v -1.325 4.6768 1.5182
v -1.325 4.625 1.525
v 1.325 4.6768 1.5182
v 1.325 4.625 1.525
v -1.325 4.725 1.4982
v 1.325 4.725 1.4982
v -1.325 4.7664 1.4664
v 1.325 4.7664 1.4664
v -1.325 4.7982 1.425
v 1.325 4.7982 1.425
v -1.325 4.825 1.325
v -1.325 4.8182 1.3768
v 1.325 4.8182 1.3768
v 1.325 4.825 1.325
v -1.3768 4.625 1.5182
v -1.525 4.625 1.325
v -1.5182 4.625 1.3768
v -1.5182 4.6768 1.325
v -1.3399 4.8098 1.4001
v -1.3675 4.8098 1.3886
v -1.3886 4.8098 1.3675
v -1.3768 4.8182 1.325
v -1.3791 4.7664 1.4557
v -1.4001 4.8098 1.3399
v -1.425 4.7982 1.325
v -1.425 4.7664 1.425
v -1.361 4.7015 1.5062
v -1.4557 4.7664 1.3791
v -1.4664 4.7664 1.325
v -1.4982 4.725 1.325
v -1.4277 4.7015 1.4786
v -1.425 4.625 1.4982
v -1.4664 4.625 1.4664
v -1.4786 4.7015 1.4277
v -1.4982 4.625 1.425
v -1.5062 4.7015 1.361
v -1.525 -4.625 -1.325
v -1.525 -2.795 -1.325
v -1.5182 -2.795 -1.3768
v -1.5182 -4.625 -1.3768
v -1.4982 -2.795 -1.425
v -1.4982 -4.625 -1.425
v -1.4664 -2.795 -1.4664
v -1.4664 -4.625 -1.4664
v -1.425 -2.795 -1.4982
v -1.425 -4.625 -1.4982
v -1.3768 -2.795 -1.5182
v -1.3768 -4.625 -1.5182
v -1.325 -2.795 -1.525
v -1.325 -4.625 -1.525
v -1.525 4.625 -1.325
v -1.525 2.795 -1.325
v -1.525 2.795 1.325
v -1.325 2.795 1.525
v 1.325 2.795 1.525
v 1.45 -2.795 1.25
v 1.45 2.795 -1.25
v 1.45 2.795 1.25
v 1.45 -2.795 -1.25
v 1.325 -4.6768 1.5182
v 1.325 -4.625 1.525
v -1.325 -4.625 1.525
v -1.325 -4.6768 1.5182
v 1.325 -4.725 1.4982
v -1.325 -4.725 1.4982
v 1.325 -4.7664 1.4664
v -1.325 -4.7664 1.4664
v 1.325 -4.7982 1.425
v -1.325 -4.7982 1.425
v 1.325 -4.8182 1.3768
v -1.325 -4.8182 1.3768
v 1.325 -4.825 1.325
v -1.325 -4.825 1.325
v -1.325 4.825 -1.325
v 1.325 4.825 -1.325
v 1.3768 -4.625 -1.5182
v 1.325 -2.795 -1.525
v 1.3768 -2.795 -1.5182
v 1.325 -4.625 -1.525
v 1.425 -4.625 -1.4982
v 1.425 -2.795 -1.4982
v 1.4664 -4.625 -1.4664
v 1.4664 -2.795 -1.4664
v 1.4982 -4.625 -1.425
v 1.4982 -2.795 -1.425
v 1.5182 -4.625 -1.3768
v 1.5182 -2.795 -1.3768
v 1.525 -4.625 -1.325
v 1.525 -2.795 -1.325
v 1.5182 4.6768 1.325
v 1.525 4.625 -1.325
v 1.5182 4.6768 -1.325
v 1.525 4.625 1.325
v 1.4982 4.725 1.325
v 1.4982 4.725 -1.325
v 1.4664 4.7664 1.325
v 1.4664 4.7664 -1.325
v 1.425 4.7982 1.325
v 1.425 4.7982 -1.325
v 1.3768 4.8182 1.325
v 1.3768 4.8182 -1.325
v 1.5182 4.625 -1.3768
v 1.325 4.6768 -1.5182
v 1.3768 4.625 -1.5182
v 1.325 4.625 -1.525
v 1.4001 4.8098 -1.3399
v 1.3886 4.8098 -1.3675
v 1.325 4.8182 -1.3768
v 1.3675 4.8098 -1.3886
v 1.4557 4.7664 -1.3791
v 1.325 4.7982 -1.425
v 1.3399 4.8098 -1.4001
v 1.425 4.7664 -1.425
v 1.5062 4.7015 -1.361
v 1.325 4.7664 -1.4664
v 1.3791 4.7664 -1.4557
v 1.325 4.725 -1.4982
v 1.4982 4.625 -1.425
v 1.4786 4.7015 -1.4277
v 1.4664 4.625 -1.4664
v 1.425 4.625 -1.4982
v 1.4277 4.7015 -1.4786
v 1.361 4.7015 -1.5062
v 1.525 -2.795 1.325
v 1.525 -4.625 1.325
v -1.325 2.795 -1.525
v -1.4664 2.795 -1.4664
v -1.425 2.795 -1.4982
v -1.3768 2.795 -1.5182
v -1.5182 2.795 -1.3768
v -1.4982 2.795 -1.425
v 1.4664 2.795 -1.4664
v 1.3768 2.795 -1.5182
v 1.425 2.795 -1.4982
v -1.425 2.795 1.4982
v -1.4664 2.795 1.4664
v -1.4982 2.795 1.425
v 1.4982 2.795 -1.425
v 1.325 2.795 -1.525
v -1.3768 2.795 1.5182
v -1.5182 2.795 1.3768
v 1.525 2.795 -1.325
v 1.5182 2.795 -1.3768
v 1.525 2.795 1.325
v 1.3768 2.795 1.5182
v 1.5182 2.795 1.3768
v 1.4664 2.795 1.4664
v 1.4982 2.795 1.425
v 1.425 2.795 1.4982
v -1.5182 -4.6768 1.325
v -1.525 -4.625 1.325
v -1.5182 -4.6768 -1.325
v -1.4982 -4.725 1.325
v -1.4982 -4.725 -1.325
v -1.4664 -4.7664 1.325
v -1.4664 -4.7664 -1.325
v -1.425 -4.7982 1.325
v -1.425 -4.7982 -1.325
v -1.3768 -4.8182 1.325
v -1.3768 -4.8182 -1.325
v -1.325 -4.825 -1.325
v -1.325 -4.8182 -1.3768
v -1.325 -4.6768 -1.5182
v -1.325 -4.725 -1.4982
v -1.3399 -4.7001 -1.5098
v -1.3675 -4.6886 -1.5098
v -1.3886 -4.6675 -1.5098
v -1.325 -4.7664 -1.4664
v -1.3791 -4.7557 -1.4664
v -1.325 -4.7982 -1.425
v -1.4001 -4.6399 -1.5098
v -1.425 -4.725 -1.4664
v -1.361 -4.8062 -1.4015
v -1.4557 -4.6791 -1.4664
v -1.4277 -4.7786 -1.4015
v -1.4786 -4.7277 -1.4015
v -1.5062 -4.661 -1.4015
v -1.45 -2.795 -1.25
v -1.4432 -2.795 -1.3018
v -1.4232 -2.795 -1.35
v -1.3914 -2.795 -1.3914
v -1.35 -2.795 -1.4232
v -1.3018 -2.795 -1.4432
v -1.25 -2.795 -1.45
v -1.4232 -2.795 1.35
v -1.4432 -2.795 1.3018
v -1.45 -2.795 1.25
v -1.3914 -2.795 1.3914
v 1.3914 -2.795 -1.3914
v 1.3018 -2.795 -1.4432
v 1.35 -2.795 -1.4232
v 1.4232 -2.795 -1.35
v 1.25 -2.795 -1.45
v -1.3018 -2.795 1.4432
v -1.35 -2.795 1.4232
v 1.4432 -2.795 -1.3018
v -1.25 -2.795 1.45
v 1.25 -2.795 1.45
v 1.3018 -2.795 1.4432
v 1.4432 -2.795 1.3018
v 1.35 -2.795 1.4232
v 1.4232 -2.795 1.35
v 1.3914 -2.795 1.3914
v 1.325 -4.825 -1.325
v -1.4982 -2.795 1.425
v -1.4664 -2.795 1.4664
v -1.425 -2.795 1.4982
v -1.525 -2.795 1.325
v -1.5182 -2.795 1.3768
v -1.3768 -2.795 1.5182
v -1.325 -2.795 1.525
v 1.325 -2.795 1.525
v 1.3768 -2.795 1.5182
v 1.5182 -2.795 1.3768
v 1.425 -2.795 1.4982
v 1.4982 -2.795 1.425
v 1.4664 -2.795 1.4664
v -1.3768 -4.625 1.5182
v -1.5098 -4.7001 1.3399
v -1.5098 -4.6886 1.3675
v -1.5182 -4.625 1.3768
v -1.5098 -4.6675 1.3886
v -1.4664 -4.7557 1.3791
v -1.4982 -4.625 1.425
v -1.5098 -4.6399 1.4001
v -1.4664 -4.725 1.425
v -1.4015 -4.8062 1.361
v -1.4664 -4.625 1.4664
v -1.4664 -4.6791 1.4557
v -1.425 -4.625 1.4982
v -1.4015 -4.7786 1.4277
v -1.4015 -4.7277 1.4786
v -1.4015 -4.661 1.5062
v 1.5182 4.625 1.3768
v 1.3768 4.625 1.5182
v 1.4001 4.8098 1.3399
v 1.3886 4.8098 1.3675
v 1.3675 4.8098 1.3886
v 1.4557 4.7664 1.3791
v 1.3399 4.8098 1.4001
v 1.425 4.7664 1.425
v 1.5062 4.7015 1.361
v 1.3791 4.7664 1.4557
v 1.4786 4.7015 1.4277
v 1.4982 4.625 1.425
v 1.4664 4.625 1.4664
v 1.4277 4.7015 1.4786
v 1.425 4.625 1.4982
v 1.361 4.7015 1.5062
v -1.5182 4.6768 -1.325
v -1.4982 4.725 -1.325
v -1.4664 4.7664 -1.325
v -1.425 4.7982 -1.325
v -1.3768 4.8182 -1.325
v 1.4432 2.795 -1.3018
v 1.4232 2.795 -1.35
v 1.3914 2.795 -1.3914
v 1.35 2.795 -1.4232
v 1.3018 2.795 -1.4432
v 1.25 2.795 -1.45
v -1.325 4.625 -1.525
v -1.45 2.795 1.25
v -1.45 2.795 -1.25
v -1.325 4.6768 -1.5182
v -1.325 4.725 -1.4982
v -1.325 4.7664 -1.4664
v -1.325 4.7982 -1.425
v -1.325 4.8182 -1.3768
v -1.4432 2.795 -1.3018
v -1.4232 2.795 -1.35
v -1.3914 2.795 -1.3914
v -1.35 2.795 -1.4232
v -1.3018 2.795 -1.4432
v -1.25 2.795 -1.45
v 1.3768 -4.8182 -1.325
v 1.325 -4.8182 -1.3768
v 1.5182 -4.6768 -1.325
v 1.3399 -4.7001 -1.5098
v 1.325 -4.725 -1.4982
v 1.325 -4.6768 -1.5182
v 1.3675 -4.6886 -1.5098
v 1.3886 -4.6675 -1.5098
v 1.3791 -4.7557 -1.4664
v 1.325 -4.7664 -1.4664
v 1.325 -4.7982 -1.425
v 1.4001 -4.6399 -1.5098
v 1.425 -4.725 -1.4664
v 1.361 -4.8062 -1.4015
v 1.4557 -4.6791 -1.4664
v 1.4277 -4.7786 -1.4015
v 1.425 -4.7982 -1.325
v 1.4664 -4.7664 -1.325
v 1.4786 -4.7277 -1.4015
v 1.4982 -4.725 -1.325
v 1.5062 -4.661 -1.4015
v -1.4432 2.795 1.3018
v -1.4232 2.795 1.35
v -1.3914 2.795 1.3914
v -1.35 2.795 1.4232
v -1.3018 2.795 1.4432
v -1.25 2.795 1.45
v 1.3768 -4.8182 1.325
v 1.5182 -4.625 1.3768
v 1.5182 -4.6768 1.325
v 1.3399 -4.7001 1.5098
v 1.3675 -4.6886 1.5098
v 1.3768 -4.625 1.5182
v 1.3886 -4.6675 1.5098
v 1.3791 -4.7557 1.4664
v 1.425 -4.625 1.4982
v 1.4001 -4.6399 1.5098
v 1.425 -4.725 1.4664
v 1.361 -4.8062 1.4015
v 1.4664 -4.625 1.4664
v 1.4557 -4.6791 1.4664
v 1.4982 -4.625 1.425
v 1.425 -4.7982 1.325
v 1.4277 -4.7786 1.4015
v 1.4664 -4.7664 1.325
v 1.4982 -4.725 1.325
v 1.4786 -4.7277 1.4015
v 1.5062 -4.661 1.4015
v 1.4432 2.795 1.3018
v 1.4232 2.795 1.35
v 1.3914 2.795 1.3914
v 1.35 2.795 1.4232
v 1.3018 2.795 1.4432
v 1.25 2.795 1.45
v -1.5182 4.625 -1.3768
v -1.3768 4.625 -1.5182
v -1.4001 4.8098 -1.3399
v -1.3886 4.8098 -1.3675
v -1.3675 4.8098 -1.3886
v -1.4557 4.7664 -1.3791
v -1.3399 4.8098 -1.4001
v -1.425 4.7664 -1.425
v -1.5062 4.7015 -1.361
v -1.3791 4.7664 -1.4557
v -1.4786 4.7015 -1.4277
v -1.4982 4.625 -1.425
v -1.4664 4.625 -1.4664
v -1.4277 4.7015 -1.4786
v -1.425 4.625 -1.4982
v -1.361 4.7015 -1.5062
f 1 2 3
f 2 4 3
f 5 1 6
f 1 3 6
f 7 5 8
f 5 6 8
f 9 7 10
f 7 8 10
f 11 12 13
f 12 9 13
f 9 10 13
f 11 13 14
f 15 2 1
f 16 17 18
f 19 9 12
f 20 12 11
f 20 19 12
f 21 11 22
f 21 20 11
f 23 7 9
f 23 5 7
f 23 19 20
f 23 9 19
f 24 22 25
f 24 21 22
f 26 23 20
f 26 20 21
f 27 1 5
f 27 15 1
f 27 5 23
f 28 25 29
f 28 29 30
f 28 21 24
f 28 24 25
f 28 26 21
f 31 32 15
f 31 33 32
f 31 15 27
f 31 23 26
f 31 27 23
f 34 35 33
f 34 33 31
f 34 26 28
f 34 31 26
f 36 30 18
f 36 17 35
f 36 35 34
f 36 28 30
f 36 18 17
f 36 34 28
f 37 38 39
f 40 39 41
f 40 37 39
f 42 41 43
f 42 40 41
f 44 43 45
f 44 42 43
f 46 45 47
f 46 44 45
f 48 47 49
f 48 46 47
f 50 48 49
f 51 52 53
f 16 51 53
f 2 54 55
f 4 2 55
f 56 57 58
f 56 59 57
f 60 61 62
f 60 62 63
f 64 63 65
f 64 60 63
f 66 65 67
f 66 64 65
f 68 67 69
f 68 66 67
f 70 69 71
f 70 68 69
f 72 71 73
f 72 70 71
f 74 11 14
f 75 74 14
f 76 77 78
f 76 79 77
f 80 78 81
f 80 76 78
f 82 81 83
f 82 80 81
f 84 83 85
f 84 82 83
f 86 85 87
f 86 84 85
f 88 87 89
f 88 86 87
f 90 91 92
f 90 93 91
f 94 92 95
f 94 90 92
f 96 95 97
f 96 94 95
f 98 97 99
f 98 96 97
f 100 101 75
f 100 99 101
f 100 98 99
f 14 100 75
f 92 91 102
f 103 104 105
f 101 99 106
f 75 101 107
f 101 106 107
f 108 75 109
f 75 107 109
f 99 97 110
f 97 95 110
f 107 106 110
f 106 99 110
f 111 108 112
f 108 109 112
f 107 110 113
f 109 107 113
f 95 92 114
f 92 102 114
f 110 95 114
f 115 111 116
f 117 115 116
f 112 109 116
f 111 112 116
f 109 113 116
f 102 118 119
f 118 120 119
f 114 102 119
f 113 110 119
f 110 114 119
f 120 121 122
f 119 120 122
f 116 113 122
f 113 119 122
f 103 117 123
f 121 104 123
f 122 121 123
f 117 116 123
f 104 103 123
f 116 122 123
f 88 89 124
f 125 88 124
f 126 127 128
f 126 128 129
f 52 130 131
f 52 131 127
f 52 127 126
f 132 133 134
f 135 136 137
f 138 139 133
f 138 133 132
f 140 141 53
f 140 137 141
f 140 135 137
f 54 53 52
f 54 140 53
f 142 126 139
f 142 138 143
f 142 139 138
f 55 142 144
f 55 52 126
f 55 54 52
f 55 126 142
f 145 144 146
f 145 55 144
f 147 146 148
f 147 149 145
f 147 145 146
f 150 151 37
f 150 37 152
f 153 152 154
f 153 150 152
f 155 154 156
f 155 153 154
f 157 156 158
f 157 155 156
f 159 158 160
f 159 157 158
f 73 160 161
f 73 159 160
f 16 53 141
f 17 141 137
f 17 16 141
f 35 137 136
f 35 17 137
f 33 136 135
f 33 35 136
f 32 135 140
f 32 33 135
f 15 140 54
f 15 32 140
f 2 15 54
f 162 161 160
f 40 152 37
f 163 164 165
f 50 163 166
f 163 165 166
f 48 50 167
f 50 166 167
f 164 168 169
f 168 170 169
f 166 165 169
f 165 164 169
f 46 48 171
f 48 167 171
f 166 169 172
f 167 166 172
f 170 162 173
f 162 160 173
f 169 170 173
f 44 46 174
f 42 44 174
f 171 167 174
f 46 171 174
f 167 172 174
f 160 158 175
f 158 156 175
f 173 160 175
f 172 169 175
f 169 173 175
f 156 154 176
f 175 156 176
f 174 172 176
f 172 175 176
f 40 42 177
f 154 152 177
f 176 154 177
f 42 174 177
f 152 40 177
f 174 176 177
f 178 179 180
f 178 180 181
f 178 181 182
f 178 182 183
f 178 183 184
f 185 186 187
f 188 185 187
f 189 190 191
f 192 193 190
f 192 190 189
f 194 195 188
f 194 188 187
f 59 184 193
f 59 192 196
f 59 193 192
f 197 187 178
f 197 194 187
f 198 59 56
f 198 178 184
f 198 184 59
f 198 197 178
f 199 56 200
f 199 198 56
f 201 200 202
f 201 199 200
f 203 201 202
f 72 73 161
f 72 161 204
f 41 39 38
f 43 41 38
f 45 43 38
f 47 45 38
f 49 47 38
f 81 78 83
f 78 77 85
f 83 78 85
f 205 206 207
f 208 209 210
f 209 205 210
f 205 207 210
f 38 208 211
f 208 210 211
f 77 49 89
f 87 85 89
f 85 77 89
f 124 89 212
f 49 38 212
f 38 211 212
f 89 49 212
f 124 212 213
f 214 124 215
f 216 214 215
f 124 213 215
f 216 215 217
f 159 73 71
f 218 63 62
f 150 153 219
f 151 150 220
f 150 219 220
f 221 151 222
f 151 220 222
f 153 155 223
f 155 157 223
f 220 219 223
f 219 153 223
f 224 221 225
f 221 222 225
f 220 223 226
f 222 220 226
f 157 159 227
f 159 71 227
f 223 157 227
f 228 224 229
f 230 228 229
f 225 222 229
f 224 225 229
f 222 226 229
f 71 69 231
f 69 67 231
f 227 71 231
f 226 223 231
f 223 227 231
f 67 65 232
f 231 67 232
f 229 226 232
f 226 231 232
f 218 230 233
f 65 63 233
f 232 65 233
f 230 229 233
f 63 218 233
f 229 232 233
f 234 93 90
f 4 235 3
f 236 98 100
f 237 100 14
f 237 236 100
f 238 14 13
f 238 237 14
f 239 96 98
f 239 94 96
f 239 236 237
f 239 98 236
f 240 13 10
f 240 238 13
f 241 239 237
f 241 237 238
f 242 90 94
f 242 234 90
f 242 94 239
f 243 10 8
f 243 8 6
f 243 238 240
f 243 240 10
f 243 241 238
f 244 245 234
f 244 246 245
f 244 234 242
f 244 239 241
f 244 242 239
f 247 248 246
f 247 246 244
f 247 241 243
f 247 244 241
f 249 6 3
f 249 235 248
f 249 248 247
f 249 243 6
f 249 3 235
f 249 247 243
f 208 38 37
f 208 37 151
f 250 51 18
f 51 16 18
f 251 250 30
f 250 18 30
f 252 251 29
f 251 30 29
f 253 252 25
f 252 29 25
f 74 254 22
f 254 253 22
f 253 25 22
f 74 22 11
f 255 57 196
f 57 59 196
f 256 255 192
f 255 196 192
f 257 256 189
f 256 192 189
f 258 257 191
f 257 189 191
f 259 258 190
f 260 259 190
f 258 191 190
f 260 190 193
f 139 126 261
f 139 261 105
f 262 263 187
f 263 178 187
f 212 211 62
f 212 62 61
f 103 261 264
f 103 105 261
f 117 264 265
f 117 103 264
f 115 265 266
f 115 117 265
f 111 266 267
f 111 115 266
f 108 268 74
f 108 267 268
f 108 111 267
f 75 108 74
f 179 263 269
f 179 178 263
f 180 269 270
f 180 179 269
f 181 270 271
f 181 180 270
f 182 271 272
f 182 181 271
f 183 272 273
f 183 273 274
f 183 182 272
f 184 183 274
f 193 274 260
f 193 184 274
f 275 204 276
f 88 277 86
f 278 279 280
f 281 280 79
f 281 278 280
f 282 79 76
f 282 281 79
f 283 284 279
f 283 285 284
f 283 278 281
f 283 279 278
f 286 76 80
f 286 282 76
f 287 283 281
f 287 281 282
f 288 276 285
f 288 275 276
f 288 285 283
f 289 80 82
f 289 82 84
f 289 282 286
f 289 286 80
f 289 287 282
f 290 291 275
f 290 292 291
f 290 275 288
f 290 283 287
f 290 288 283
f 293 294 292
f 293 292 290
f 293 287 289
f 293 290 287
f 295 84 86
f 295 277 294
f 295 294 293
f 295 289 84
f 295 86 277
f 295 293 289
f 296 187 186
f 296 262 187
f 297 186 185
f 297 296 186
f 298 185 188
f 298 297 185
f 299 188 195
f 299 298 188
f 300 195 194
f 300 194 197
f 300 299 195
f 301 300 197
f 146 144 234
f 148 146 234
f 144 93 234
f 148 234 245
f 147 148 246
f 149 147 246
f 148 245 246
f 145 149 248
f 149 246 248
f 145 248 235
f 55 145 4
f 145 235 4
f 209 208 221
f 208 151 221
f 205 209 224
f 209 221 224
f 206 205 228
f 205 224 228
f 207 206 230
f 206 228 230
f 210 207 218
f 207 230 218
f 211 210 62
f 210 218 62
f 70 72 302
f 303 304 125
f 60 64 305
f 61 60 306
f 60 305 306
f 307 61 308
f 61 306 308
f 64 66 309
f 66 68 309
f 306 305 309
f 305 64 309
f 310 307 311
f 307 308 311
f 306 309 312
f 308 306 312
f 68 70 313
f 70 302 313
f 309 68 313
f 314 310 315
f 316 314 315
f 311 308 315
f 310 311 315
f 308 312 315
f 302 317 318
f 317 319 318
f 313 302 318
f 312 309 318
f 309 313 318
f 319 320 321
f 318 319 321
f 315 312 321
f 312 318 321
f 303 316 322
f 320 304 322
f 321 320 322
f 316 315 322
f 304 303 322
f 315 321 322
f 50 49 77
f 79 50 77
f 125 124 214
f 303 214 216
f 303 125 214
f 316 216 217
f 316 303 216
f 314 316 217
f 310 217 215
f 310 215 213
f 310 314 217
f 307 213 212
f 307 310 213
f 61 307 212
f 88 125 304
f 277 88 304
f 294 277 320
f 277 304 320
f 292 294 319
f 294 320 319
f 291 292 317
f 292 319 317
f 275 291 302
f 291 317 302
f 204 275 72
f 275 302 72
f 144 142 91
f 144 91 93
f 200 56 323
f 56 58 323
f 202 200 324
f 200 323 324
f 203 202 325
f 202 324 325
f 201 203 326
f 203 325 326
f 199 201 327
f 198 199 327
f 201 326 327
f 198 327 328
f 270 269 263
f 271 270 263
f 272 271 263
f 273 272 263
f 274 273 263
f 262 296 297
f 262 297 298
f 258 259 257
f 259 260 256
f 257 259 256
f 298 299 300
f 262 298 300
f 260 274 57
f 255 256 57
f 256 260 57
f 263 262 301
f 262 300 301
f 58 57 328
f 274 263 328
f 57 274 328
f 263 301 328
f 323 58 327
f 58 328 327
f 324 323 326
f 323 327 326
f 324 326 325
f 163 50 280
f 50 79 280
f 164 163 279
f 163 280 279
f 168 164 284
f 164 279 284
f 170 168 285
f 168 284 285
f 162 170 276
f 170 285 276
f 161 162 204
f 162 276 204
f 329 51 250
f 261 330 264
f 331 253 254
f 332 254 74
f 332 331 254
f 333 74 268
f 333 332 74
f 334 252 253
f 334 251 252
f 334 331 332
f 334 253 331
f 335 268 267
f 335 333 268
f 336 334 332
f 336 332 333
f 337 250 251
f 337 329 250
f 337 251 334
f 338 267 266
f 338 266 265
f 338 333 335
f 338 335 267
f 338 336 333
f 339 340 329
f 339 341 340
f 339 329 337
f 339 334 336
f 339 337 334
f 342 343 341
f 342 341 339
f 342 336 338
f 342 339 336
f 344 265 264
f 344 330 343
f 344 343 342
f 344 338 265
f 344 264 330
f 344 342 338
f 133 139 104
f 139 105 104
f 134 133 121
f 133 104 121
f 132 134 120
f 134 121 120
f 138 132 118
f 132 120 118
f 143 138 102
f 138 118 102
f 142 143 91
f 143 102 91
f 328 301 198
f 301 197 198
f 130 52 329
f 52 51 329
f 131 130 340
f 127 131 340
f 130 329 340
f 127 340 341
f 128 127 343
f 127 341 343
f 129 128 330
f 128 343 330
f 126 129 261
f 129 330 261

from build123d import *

# Parameters (mm, degrees)
F2_W     = 2.9
F2_H     = 2.9
F3_DEPTH = 2.795
F4_W     = 3.05
F4_H     = 3.05
F5_DEPTH = 2.03
F6_R     = 0.2
F6_2_R   = 0.2
F6_3_R   = 0.2


# Not quite as in the source:
# - two fillets or chamfers of one size are made in one step
# - a pattern or mirror of a feature is missing from the dataset's text; its kind, count and spacing are read off the source's solid


with BuildPart() as f3:
    # F2 (on Front) → F3 (new body, symmetric)
    with BuildSketch(Plane.XZ):
        Rectangle(F2_W, F2_H)
    extrude(amount=F3_DEPTH, both=True)

    # F6#2
    f6_2_edges = [f3.edges().sort_by_distance(p)[0] for p in [
        (1.45, 0, 1.45),
        (1.45, 0, -1.45),
        (-1.45, 0, -1.45),
        (-1.45, 0, 1.45),
    ]]
    fillet(f6_2_edges, radius=F6_2_R)


with BuildPart() as f5:
    # F4 (on face) → F5 (new body)
    with BuildSketch(Plane.XZ.offset(2.795)):
        Rectangle(F4_W, F4_H)
    extrude(amount=F5_DEPTH)


with BuildPart() as f5_copies_1:
    # F5_copies: instance of F5
    add(f5.part.mirror(Plane.ZX))

    # F6#3
    f6_3_edges = [f5_copies_1.edges().sort_by_distance(p)[0] for p in [
        (1.525, 3.81, -1.525),
        (1.525, 3.81, 1.525),
        (1.525, 4.825, 0),
        (-1.525, 3.81, 1.525),
        (0, 4.825, 1.525),
        (-1.525, 3.81, -1.525),
        (-1.525, 4.825, 0),
        (0, 4.825, -1.525),
    ]]
    fillet(f6_3_edges, radius=F6_3_R)


with BuildPart() as f5_1:
    add(f5.part)

    # F6
    f6_edges = [f5_1.edges().sort_by_distance(p)[0] for p in [
        (1.525, -4.825, 0),
        (0, -4.825, 1.525),
        (-1.525, -4.825, 0),
        (0, -4.825, -1.525),
        (1.525, -3.81, -1.525),
        (-1.525, -3.81, -1.525),
        (1.525, -3.81, 1.525),
        (-1.525, -3.81, 1.525),
    ]]
    fillet(f6_edges, radius=F6_R)


solid = Compound([f3.part, f5_copies_1.part, f5_1.part])
